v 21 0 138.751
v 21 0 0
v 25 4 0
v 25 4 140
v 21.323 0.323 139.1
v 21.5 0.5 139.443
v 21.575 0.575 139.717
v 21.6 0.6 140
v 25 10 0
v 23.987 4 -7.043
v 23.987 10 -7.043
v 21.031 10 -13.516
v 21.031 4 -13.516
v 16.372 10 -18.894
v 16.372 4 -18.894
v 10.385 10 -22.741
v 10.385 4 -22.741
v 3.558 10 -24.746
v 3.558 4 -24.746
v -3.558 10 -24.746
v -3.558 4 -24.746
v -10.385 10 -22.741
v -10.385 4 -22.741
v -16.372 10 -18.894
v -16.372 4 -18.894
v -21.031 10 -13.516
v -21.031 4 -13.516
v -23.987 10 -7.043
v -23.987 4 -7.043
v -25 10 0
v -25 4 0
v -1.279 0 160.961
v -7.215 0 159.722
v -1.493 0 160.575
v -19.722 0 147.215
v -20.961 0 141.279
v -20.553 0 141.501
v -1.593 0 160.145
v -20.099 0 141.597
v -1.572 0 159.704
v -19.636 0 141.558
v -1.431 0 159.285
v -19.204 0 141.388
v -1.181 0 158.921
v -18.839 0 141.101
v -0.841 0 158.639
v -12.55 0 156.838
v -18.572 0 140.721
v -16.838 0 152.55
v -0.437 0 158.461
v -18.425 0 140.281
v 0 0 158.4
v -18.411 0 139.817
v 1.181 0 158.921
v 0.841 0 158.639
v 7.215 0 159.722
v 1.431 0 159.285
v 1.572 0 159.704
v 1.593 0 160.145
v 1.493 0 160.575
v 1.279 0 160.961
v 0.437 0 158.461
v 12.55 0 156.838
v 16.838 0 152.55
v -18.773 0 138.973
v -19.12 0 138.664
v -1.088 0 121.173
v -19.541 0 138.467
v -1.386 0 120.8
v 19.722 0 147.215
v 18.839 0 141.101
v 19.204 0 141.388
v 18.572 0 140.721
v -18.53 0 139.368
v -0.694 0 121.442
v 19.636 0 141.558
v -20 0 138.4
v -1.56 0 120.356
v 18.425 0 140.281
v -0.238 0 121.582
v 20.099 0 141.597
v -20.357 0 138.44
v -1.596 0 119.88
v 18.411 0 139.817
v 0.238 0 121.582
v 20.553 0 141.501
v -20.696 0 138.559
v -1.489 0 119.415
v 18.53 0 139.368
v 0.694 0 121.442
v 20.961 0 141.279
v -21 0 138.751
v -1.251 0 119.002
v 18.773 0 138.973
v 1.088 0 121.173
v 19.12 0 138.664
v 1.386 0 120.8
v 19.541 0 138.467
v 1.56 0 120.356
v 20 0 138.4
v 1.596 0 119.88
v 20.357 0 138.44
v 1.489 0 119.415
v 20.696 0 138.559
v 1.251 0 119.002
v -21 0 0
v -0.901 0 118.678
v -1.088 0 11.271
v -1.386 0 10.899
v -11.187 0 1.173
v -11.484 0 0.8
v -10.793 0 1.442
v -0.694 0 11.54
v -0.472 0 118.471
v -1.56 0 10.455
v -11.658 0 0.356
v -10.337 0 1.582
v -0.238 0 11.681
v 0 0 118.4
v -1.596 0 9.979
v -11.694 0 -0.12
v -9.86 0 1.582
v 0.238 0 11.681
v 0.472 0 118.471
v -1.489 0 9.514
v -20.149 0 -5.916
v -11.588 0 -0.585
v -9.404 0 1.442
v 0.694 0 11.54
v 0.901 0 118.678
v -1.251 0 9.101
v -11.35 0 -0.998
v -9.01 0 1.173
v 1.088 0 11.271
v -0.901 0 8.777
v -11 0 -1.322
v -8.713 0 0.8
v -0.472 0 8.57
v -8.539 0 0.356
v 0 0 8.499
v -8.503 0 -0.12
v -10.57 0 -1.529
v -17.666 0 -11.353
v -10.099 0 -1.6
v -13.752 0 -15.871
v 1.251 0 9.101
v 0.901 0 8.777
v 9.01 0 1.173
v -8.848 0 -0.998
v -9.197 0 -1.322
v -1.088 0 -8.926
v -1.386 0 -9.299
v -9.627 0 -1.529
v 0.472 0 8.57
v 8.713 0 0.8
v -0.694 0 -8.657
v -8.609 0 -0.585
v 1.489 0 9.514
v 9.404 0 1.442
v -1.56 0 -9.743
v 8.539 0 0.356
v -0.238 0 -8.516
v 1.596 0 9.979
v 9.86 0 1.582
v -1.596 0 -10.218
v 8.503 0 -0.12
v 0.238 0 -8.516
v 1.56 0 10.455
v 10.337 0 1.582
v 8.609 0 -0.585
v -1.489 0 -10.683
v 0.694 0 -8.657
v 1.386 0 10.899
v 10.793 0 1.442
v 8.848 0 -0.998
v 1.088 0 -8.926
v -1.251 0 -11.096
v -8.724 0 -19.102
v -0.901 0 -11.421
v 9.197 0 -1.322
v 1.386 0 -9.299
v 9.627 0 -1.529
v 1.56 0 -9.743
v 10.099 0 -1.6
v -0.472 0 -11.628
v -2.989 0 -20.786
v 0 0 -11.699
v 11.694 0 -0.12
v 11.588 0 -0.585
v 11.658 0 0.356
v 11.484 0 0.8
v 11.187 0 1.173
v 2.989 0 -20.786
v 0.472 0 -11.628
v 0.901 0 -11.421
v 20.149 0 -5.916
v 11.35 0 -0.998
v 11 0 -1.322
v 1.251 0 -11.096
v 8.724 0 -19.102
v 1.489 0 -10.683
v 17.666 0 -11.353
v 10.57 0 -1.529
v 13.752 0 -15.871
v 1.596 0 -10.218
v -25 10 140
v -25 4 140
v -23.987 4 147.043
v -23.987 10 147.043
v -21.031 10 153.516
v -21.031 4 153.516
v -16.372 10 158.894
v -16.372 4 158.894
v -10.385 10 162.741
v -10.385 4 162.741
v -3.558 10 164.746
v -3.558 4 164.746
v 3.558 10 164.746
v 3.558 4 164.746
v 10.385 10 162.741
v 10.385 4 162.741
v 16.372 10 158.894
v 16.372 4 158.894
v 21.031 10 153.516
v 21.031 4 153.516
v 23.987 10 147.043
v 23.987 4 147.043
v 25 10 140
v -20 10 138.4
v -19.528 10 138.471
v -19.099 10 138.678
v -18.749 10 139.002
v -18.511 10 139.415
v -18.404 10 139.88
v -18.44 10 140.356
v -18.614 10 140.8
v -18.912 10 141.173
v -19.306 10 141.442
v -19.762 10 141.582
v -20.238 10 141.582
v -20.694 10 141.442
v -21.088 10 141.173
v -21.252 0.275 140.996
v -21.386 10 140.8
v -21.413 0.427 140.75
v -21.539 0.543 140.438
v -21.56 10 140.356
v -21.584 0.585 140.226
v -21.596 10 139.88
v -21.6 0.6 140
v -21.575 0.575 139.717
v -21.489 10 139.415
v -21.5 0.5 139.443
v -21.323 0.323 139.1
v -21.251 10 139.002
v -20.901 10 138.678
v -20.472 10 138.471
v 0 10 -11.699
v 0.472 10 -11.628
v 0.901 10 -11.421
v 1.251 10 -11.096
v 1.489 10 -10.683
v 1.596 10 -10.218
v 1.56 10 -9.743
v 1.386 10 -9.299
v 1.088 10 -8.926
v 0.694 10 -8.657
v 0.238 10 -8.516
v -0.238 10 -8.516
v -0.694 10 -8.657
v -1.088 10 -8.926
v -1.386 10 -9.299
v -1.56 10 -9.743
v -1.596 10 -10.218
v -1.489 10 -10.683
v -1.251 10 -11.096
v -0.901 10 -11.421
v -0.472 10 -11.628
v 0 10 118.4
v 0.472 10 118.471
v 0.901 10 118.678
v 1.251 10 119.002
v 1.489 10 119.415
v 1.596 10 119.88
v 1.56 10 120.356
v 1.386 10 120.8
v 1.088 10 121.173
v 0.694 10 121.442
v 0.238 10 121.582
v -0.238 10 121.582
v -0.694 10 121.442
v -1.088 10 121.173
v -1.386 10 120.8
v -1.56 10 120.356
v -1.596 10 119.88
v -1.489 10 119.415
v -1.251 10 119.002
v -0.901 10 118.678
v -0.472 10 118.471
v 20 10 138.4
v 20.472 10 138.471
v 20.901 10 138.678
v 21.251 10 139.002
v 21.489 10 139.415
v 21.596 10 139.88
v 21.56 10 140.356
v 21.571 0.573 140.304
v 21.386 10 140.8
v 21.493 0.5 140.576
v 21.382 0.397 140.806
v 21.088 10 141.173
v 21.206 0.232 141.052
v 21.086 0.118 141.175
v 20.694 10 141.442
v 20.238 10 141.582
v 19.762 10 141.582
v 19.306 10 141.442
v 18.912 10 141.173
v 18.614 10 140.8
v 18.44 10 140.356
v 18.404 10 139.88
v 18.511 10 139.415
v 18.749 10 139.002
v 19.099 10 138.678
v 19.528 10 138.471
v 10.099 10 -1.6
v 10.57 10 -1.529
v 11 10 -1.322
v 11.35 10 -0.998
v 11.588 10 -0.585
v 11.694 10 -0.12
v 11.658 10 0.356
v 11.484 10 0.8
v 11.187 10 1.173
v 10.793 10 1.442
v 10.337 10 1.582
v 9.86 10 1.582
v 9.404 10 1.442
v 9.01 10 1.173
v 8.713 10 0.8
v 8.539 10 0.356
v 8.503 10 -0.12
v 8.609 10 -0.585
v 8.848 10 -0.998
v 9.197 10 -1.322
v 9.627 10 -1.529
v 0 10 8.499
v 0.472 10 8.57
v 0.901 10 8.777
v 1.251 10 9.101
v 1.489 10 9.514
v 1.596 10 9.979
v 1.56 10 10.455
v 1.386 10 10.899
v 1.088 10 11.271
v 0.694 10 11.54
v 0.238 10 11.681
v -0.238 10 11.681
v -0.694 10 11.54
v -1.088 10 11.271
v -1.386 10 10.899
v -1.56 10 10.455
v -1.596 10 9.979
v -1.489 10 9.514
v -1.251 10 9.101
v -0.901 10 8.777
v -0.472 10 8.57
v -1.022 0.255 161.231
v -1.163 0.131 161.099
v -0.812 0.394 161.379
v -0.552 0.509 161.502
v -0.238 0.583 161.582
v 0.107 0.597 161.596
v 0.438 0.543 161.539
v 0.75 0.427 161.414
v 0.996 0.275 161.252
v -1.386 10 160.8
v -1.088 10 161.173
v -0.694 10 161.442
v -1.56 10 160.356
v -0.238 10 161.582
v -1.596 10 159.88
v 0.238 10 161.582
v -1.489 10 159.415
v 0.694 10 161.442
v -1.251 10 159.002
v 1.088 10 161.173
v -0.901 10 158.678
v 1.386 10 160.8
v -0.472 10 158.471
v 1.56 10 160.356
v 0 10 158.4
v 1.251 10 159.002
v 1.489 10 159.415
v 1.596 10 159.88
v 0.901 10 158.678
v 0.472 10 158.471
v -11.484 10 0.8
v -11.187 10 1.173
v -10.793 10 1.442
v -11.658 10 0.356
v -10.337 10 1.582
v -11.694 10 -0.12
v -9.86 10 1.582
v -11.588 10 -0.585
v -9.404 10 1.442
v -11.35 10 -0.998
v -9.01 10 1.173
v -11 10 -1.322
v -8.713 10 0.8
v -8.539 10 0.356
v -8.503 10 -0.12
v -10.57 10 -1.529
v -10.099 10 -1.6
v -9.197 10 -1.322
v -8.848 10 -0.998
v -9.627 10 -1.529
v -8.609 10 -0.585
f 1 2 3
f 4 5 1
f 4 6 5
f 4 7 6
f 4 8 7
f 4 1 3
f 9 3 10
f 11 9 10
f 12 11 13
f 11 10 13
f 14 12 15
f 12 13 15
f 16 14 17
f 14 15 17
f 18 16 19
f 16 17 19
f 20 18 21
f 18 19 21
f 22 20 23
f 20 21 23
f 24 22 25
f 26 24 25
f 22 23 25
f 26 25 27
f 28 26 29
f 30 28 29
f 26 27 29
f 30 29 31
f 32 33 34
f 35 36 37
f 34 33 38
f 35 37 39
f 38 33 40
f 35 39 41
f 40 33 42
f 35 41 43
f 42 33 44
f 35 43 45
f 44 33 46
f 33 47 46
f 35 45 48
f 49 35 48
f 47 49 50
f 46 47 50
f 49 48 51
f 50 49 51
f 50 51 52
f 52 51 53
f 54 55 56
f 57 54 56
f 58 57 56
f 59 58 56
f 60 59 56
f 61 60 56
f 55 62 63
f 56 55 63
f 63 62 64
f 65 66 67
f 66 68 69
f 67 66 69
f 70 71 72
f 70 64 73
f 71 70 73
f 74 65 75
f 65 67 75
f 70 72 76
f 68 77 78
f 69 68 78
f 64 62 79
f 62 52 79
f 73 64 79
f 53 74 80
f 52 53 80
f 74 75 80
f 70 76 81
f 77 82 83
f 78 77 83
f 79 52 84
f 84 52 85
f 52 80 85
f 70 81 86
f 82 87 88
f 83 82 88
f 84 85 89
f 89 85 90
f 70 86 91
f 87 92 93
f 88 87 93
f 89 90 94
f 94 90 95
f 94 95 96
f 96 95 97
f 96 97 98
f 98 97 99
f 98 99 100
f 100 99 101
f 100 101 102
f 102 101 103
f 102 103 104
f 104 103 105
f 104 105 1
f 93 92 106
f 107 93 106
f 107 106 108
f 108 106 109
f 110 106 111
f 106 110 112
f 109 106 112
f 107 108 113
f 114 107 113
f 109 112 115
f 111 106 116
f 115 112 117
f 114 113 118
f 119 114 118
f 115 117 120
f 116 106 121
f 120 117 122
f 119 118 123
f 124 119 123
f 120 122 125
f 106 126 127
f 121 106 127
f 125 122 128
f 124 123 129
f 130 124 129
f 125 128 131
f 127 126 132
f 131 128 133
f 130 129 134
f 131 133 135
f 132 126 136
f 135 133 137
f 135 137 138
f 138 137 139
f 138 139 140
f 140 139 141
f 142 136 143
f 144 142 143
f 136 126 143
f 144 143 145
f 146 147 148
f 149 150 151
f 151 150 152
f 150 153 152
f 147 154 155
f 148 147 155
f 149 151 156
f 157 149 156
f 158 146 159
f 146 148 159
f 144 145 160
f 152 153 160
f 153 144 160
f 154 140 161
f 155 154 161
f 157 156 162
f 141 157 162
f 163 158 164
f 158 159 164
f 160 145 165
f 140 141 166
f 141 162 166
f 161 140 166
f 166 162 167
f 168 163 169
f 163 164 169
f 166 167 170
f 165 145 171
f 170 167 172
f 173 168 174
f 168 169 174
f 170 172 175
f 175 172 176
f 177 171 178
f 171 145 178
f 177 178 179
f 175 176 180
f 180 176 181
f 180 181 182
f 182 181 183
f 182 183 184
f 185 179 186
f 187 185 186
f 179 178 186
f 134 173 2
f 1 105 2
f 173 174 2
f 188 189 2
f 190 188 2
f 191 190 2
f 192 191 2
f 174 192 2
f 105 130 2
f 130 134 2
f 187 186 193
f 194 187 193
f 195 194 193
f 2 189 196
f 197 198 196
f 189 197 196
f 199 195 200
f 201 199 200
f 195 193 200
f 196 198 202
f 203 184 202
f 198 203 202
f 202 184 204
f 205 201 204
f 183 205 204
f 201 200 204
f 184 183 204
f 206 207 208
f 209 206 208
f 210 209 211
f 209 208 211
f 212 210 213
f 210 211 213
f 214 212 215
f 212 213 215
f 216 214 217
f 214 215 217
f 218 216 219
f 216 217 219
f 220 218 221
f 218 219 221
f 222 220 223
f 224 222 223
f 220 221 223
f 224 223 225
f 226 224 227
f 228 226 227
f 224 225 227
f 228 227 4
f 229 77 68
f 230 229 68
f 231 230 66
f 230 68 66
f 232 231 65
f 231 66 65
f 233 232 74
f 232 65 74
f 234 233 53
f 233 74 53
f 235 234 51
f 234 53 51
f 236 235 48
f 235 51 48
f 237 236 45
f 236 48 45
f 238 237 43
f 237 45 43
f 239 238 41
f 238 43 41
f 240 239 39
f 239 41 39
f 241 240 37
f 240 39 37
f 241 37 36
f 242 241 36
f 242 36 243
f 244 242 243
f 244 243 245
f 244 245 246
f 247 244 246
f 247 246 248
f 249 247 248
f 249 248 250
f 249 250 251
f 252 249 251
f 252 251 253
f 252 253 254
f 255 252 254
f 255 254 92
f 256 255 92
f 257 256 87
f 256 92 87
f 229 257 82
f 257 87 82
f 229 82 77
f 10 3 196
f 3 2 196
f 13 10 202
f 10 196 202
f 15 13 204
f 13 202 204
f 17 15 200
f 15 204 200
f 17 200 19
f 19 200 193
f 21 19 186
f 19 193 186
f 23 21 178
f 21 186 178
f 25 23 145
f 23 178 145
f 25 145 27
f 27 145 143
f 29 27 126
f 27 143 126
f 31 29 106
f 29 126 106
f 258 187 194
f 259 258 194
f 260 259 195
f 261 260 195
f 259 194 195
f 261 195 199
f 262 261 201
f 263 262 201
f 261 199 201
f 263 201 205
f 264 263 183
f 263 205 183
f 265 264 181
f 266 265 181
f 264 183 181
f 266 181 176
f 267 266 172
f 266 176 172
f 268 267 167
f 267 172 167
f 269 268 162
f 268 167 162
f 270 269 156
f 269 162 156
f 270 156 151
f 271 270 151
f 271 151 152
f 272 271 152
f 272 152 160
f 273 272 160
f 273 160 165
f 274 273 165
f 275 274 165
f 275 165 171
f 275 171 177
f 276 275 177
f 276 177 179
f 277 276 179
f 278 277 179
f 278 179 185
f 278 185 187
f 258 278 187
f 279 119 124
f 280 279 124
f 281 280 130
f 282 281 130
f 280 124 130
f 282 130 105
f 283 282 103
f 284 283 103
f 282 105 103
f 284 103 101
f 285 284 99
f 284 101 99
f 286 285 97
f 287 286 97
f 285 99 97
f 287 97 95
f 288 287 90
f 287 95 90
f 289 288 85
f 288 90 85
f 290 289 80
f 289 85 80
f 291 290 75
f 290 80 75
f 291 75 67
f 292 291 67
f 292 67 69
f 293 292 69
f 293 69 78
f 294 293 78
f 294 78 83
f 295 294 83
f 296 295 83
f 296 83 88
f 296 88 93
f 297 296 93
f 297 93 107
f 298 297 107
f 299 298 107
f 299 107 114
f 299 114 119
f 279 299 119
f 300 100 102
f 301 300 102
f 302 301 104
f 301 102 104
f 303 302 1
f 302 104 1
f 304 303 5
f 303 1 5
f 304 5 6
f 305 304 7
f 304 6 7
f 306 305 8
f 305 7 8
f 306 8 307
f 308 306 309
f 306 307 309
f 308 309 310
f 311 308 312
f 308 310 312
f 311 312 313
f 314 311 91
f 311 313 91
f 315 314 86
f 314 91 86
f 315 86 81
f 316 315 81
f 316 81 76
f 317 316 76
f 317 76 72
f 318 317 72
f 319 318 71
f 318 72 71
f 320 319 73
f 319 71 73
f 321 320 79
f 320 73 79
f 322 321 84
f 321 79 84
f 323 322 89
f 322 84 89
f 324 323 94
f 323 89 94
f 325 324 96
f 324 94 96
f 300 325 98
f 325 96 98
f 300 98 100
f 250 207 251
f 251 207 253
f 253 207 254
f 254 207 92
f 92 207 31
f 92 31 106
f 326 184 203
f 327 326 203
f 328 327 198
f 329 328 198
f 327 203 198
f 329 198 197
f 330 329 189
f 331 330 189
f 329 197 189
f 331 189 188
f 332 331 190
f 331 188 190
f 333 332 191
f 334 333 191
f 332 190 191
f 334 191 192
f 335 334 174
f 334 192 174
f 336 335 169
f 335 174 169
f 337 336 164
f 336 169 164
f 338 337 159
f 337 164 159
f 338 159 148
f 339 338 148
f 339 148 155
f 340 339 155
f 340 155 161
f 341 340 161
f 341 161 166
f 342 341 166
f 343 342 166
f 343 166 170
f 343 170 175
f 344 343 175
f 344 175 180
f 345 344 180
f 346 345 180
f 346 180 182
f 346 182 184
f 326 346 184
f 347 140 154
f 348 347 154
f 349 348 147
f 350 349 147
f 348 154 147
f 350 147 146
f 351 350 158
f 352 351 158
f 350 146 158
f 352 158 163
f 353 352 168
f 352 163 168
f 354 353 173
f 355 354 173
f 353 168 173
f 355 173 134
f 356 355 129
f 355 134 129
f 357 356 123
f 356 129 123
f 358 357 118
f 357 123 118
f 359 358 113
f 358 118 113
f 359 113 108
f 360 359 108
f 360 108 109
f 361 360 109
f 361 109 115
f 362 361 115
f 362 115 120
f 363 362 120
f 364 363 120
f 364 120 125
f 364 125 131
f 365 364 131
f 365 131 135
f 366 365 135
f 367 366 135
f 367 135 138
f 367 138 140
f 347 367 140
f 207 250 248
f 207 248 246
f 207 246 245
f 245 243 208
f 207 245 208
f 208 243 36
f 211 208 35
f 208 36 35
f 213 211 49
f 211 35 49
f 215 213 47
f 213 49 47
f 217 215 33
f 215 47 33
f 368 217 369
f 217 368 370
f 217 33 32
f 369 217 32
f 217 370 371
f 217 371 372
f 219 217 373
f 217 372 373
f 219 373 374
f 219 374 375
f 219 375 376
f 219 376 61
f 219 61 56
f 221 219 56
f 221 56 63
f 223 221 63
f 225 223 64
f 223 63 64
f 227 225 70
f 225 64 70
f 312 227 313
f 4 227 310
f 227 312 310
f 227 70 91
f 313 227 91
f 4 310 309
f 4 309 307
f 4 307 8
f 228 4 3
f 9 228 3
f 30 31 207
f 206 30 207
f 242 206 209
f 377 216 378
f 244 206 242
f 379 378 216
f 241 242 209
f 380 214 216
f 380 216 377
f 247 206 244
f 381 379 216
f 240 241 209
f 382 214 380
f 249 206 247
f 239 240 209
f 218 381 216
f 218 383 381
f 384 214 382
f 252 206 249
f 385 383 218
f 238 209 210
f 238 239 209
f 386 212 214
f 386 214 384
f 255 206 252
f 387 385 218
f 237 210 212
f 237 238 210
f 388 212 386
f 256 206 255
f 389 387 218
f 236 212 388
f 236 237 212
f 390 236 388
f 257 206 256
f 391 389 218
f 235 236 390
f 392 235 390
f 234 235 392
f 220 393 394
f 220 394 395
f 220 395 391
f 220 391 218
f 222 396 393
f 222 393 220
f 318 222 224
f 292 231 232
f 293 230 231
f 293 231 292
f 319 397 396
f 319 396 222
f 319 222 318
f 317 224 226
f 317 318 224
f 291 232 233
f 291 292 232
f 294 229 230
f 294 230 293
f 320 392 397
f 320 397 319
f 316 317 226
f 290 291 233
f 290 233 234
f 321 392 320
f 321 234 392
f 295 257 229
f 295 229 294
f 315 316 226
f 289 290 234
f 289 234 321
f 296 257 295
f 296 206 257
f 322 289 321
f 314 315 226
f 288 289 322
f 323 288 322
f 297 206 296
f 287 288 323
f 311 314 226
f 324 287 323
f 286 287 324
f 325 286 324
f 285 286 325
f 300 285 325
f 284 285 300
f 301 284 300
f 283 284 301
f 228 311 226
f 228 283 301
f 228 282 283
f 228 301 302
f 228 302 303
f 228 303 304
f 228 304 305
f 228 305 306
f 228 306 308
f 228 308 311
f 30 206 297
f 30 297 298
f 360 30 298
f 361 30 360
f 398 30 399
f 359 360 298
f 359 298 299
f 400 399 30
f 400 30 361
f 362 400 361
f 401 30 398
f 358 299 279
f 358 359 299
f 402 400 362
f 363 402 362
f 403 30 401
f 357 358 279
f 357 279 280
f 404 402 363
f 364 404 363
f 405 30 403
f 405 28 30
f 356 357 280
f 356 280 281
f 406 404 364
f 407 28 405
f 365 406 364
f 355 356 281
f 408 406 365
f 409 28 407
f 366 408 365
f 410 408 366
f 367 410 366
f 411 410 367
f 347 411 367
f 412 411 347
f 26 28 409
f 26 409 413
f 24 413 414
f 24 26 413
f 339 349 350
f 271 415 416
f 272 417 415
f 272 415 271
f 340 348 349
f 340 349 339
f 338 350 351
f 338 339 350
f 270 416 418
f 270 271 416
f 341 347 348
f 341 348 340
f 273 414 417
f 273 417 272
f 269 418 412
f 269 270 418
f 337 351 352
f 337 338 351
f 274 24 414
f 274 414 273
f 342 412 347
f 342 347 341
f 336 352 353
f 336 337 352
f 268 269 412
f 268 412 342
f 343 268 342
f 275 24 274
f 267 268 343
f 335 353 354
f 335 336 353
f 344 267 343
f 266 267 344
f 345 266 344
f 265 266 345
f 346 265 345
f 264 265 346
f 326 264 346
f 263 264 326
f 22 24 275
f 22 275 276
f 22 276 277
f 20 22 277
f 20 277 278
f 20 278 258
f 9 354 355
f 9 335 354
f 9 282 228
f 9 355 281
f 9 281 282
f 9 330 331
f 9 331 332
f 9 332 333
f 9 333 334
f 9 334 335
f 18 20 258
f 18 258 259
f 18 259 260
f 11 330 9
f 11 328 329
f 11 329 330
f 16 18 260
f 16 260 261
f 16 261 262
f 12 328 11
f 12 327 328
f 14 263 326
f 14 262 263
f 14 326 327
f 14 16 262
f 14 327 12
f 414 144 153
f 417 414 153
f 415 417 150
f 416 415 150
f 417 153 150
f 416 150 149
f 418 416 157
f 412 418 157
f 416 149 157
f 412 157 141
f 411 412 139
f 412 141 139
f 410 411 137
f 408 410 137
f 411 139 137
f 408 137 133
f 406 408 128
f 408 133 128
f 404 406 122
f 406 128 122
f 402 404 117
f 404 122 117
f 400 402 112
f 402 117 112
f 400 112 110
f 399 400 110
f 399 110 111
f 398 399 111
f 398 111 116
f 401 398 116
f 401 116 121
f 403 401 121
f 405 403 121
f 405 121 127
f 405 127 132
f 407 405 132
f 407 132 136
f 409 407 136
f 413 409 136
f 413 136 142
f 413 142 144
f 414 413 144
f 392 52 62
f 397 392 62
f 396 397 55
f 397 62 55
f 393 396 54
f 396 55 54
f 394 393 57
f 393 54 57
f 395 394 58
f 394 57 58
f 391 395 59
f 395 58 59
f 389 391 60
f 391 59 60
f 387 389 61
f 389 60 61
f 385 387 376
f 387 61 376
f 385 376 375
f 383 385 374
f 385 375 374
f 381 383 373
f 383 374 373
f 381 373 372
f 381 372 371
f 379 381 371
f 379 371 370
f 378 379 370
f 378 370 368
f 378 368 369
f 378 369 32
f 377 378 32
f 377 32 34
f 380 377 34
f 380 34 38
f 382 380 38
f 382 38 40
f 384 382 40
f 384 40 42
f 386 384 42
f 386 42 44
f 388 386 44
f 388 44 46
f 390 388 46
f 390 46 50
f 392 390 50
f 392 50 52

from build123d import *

# Parameters (mm, degrees)
BOSS_EXTRUDE1_DEPTH = 10
SKETCH3_R           = 1.6
CUT_EXTRUDE1_DEPTH  = 168.182534973
SKETCH4_R           = 1.6
CUT_EXTRUDE2_DEPTH  = 168.182534973
CHAMFER1_SIZE       = 4


with BuildPart() as part:
    # Sketch1 → Boss-Extrude1 (new body)
    with BuildSketch(Plane(origin=(0, 0, 0), x_dir=(1, 0, 0), z_dir=(0, 1, 0))):
        with BuildLine():
            Line((-25, 0), (-25, -140))
            ThreePointArc((-25, -140), (0, -165), (25, -140))
            Line((25, -140), (25, 0))
            ThreePointArc((25, 0), (0, 25), (-25, 0))
        make_face()
    extrude(amount=BOSS_EXTRUDE1_DEPTH)

    # Sketch3 → Cut-Extrude1 (cut, through all)
    with BuildSketch(Plane.XZ):
        with Locations(Location((10.098593171, 0, 0), (0, 0, 270))):
            Circle(SKETCH3_R)
        with Locations(Location((0, 10.098593171, 0), (0, 0, 270))):
            Circle(SKETCH3_R)
        with Locations(Location((0, -10.098593171, 0), (0, 0, 270))):
            Circle(SKETCH3_R)
        with Locations(Location((-10.098593171, 0, 0), (0, 0, 270))):
            Circle(SKETCH3_R)
    extrude(amount=-CUT_EXTRUDE1_DEPTH, mode=Mode.SUBTRACT)

    # Sketch4 → Cut-Extrude2 (cut, through all)
    with BuildSketch(Plane.XZ):
        with Locations(Location((0, 120, 0), (0, 0, 270))):
            Circle(SKETCH4_R)
        with Locations(Location((20, 140, 0), (0, 0, 270))):
            Circle(SKETCH4_R)
        with Locations(Location((0, 160, 0), (0, 0, 270))):
            Circle(SKETCH4_R)
        with Locations(Location((-20, 140, 0), (0, 0, 270))):
            Circle(SKETCH4_R)
    extrude(amount=-CUT_EXTRUDE2_DEPTH, mode=Mode.SUBTRACT)

    # Chamfer1
    # the kernel refuses this chamfer: 4 mm, written as the material it takes off along each edge
    with BuildSketch(Plane(origin=(25, 0, 140), x_dir=(-0.9996219169112968, -0.027495876610586365, 0), z_dir=(0, 0, -1))) as chamfer1_piece_1:
        Polygon((CHAMFER1_SIZE * 0.999621916911, CHAMFER1_SIZE * 0.0274958766106), (-CHAMFER1_SIZE * 0.0274958766106, CHAMFER1_SIZE * 0.999621916911), (0, 0), align=None)
    extrude(amount=140, mode=Mode.SUBTRACT)
    with BuildSketch(Plane(origin=(0, 0, 140), x_dir=(-1, 0, 0), z_dir=(0, 0, -1))) as chamfer1_piece_2:
        Polygon((25, CHAMFER1_SIZE), (25 - CHAMFER1_SIZE, 0), (25, 0), align=None)
    revolve(axis=Axis((0, 0, 140), (0, 1, 0)), revolution_arc=180, mode=Mode.SUBTRACT)
    with BuildSketch(Plane(origin=(-25, 0, 0), x_dir=(-0.027495876610586494, 0.9996219169112968, 0), z_dir=(0, 0, 1))) as chamfer1_piece_3:
        Polygon((CHAMFER1_SIZE * 0.999621916911, -CHAMFER1_SIZE * 0.0274958766106), (-CHAMFER1_SIZE * 0.0274958766106, -CHAMFER1_SIZE * 0.999621916911), (0, 0), align=None)
    extrude(amount=140, mode=Mode.SUBTRACT)
    with BuildSketch(Plane(origin=(0, 0, 0), x_dir=(1, 0, 0), z_dir=(0, 0, 1))) as chamfer1_piece_4:
        Polygon((25, CHAMFER1_SIZE), (25 - CHAMFER1_SIZE, 0), (25, 0), align=None)
    revolve(axis=Axis((0, 0, 0), (0, 1, 0)), revolution_arc=180, mode=Mode.SUBTRACT)


solid = part.part
